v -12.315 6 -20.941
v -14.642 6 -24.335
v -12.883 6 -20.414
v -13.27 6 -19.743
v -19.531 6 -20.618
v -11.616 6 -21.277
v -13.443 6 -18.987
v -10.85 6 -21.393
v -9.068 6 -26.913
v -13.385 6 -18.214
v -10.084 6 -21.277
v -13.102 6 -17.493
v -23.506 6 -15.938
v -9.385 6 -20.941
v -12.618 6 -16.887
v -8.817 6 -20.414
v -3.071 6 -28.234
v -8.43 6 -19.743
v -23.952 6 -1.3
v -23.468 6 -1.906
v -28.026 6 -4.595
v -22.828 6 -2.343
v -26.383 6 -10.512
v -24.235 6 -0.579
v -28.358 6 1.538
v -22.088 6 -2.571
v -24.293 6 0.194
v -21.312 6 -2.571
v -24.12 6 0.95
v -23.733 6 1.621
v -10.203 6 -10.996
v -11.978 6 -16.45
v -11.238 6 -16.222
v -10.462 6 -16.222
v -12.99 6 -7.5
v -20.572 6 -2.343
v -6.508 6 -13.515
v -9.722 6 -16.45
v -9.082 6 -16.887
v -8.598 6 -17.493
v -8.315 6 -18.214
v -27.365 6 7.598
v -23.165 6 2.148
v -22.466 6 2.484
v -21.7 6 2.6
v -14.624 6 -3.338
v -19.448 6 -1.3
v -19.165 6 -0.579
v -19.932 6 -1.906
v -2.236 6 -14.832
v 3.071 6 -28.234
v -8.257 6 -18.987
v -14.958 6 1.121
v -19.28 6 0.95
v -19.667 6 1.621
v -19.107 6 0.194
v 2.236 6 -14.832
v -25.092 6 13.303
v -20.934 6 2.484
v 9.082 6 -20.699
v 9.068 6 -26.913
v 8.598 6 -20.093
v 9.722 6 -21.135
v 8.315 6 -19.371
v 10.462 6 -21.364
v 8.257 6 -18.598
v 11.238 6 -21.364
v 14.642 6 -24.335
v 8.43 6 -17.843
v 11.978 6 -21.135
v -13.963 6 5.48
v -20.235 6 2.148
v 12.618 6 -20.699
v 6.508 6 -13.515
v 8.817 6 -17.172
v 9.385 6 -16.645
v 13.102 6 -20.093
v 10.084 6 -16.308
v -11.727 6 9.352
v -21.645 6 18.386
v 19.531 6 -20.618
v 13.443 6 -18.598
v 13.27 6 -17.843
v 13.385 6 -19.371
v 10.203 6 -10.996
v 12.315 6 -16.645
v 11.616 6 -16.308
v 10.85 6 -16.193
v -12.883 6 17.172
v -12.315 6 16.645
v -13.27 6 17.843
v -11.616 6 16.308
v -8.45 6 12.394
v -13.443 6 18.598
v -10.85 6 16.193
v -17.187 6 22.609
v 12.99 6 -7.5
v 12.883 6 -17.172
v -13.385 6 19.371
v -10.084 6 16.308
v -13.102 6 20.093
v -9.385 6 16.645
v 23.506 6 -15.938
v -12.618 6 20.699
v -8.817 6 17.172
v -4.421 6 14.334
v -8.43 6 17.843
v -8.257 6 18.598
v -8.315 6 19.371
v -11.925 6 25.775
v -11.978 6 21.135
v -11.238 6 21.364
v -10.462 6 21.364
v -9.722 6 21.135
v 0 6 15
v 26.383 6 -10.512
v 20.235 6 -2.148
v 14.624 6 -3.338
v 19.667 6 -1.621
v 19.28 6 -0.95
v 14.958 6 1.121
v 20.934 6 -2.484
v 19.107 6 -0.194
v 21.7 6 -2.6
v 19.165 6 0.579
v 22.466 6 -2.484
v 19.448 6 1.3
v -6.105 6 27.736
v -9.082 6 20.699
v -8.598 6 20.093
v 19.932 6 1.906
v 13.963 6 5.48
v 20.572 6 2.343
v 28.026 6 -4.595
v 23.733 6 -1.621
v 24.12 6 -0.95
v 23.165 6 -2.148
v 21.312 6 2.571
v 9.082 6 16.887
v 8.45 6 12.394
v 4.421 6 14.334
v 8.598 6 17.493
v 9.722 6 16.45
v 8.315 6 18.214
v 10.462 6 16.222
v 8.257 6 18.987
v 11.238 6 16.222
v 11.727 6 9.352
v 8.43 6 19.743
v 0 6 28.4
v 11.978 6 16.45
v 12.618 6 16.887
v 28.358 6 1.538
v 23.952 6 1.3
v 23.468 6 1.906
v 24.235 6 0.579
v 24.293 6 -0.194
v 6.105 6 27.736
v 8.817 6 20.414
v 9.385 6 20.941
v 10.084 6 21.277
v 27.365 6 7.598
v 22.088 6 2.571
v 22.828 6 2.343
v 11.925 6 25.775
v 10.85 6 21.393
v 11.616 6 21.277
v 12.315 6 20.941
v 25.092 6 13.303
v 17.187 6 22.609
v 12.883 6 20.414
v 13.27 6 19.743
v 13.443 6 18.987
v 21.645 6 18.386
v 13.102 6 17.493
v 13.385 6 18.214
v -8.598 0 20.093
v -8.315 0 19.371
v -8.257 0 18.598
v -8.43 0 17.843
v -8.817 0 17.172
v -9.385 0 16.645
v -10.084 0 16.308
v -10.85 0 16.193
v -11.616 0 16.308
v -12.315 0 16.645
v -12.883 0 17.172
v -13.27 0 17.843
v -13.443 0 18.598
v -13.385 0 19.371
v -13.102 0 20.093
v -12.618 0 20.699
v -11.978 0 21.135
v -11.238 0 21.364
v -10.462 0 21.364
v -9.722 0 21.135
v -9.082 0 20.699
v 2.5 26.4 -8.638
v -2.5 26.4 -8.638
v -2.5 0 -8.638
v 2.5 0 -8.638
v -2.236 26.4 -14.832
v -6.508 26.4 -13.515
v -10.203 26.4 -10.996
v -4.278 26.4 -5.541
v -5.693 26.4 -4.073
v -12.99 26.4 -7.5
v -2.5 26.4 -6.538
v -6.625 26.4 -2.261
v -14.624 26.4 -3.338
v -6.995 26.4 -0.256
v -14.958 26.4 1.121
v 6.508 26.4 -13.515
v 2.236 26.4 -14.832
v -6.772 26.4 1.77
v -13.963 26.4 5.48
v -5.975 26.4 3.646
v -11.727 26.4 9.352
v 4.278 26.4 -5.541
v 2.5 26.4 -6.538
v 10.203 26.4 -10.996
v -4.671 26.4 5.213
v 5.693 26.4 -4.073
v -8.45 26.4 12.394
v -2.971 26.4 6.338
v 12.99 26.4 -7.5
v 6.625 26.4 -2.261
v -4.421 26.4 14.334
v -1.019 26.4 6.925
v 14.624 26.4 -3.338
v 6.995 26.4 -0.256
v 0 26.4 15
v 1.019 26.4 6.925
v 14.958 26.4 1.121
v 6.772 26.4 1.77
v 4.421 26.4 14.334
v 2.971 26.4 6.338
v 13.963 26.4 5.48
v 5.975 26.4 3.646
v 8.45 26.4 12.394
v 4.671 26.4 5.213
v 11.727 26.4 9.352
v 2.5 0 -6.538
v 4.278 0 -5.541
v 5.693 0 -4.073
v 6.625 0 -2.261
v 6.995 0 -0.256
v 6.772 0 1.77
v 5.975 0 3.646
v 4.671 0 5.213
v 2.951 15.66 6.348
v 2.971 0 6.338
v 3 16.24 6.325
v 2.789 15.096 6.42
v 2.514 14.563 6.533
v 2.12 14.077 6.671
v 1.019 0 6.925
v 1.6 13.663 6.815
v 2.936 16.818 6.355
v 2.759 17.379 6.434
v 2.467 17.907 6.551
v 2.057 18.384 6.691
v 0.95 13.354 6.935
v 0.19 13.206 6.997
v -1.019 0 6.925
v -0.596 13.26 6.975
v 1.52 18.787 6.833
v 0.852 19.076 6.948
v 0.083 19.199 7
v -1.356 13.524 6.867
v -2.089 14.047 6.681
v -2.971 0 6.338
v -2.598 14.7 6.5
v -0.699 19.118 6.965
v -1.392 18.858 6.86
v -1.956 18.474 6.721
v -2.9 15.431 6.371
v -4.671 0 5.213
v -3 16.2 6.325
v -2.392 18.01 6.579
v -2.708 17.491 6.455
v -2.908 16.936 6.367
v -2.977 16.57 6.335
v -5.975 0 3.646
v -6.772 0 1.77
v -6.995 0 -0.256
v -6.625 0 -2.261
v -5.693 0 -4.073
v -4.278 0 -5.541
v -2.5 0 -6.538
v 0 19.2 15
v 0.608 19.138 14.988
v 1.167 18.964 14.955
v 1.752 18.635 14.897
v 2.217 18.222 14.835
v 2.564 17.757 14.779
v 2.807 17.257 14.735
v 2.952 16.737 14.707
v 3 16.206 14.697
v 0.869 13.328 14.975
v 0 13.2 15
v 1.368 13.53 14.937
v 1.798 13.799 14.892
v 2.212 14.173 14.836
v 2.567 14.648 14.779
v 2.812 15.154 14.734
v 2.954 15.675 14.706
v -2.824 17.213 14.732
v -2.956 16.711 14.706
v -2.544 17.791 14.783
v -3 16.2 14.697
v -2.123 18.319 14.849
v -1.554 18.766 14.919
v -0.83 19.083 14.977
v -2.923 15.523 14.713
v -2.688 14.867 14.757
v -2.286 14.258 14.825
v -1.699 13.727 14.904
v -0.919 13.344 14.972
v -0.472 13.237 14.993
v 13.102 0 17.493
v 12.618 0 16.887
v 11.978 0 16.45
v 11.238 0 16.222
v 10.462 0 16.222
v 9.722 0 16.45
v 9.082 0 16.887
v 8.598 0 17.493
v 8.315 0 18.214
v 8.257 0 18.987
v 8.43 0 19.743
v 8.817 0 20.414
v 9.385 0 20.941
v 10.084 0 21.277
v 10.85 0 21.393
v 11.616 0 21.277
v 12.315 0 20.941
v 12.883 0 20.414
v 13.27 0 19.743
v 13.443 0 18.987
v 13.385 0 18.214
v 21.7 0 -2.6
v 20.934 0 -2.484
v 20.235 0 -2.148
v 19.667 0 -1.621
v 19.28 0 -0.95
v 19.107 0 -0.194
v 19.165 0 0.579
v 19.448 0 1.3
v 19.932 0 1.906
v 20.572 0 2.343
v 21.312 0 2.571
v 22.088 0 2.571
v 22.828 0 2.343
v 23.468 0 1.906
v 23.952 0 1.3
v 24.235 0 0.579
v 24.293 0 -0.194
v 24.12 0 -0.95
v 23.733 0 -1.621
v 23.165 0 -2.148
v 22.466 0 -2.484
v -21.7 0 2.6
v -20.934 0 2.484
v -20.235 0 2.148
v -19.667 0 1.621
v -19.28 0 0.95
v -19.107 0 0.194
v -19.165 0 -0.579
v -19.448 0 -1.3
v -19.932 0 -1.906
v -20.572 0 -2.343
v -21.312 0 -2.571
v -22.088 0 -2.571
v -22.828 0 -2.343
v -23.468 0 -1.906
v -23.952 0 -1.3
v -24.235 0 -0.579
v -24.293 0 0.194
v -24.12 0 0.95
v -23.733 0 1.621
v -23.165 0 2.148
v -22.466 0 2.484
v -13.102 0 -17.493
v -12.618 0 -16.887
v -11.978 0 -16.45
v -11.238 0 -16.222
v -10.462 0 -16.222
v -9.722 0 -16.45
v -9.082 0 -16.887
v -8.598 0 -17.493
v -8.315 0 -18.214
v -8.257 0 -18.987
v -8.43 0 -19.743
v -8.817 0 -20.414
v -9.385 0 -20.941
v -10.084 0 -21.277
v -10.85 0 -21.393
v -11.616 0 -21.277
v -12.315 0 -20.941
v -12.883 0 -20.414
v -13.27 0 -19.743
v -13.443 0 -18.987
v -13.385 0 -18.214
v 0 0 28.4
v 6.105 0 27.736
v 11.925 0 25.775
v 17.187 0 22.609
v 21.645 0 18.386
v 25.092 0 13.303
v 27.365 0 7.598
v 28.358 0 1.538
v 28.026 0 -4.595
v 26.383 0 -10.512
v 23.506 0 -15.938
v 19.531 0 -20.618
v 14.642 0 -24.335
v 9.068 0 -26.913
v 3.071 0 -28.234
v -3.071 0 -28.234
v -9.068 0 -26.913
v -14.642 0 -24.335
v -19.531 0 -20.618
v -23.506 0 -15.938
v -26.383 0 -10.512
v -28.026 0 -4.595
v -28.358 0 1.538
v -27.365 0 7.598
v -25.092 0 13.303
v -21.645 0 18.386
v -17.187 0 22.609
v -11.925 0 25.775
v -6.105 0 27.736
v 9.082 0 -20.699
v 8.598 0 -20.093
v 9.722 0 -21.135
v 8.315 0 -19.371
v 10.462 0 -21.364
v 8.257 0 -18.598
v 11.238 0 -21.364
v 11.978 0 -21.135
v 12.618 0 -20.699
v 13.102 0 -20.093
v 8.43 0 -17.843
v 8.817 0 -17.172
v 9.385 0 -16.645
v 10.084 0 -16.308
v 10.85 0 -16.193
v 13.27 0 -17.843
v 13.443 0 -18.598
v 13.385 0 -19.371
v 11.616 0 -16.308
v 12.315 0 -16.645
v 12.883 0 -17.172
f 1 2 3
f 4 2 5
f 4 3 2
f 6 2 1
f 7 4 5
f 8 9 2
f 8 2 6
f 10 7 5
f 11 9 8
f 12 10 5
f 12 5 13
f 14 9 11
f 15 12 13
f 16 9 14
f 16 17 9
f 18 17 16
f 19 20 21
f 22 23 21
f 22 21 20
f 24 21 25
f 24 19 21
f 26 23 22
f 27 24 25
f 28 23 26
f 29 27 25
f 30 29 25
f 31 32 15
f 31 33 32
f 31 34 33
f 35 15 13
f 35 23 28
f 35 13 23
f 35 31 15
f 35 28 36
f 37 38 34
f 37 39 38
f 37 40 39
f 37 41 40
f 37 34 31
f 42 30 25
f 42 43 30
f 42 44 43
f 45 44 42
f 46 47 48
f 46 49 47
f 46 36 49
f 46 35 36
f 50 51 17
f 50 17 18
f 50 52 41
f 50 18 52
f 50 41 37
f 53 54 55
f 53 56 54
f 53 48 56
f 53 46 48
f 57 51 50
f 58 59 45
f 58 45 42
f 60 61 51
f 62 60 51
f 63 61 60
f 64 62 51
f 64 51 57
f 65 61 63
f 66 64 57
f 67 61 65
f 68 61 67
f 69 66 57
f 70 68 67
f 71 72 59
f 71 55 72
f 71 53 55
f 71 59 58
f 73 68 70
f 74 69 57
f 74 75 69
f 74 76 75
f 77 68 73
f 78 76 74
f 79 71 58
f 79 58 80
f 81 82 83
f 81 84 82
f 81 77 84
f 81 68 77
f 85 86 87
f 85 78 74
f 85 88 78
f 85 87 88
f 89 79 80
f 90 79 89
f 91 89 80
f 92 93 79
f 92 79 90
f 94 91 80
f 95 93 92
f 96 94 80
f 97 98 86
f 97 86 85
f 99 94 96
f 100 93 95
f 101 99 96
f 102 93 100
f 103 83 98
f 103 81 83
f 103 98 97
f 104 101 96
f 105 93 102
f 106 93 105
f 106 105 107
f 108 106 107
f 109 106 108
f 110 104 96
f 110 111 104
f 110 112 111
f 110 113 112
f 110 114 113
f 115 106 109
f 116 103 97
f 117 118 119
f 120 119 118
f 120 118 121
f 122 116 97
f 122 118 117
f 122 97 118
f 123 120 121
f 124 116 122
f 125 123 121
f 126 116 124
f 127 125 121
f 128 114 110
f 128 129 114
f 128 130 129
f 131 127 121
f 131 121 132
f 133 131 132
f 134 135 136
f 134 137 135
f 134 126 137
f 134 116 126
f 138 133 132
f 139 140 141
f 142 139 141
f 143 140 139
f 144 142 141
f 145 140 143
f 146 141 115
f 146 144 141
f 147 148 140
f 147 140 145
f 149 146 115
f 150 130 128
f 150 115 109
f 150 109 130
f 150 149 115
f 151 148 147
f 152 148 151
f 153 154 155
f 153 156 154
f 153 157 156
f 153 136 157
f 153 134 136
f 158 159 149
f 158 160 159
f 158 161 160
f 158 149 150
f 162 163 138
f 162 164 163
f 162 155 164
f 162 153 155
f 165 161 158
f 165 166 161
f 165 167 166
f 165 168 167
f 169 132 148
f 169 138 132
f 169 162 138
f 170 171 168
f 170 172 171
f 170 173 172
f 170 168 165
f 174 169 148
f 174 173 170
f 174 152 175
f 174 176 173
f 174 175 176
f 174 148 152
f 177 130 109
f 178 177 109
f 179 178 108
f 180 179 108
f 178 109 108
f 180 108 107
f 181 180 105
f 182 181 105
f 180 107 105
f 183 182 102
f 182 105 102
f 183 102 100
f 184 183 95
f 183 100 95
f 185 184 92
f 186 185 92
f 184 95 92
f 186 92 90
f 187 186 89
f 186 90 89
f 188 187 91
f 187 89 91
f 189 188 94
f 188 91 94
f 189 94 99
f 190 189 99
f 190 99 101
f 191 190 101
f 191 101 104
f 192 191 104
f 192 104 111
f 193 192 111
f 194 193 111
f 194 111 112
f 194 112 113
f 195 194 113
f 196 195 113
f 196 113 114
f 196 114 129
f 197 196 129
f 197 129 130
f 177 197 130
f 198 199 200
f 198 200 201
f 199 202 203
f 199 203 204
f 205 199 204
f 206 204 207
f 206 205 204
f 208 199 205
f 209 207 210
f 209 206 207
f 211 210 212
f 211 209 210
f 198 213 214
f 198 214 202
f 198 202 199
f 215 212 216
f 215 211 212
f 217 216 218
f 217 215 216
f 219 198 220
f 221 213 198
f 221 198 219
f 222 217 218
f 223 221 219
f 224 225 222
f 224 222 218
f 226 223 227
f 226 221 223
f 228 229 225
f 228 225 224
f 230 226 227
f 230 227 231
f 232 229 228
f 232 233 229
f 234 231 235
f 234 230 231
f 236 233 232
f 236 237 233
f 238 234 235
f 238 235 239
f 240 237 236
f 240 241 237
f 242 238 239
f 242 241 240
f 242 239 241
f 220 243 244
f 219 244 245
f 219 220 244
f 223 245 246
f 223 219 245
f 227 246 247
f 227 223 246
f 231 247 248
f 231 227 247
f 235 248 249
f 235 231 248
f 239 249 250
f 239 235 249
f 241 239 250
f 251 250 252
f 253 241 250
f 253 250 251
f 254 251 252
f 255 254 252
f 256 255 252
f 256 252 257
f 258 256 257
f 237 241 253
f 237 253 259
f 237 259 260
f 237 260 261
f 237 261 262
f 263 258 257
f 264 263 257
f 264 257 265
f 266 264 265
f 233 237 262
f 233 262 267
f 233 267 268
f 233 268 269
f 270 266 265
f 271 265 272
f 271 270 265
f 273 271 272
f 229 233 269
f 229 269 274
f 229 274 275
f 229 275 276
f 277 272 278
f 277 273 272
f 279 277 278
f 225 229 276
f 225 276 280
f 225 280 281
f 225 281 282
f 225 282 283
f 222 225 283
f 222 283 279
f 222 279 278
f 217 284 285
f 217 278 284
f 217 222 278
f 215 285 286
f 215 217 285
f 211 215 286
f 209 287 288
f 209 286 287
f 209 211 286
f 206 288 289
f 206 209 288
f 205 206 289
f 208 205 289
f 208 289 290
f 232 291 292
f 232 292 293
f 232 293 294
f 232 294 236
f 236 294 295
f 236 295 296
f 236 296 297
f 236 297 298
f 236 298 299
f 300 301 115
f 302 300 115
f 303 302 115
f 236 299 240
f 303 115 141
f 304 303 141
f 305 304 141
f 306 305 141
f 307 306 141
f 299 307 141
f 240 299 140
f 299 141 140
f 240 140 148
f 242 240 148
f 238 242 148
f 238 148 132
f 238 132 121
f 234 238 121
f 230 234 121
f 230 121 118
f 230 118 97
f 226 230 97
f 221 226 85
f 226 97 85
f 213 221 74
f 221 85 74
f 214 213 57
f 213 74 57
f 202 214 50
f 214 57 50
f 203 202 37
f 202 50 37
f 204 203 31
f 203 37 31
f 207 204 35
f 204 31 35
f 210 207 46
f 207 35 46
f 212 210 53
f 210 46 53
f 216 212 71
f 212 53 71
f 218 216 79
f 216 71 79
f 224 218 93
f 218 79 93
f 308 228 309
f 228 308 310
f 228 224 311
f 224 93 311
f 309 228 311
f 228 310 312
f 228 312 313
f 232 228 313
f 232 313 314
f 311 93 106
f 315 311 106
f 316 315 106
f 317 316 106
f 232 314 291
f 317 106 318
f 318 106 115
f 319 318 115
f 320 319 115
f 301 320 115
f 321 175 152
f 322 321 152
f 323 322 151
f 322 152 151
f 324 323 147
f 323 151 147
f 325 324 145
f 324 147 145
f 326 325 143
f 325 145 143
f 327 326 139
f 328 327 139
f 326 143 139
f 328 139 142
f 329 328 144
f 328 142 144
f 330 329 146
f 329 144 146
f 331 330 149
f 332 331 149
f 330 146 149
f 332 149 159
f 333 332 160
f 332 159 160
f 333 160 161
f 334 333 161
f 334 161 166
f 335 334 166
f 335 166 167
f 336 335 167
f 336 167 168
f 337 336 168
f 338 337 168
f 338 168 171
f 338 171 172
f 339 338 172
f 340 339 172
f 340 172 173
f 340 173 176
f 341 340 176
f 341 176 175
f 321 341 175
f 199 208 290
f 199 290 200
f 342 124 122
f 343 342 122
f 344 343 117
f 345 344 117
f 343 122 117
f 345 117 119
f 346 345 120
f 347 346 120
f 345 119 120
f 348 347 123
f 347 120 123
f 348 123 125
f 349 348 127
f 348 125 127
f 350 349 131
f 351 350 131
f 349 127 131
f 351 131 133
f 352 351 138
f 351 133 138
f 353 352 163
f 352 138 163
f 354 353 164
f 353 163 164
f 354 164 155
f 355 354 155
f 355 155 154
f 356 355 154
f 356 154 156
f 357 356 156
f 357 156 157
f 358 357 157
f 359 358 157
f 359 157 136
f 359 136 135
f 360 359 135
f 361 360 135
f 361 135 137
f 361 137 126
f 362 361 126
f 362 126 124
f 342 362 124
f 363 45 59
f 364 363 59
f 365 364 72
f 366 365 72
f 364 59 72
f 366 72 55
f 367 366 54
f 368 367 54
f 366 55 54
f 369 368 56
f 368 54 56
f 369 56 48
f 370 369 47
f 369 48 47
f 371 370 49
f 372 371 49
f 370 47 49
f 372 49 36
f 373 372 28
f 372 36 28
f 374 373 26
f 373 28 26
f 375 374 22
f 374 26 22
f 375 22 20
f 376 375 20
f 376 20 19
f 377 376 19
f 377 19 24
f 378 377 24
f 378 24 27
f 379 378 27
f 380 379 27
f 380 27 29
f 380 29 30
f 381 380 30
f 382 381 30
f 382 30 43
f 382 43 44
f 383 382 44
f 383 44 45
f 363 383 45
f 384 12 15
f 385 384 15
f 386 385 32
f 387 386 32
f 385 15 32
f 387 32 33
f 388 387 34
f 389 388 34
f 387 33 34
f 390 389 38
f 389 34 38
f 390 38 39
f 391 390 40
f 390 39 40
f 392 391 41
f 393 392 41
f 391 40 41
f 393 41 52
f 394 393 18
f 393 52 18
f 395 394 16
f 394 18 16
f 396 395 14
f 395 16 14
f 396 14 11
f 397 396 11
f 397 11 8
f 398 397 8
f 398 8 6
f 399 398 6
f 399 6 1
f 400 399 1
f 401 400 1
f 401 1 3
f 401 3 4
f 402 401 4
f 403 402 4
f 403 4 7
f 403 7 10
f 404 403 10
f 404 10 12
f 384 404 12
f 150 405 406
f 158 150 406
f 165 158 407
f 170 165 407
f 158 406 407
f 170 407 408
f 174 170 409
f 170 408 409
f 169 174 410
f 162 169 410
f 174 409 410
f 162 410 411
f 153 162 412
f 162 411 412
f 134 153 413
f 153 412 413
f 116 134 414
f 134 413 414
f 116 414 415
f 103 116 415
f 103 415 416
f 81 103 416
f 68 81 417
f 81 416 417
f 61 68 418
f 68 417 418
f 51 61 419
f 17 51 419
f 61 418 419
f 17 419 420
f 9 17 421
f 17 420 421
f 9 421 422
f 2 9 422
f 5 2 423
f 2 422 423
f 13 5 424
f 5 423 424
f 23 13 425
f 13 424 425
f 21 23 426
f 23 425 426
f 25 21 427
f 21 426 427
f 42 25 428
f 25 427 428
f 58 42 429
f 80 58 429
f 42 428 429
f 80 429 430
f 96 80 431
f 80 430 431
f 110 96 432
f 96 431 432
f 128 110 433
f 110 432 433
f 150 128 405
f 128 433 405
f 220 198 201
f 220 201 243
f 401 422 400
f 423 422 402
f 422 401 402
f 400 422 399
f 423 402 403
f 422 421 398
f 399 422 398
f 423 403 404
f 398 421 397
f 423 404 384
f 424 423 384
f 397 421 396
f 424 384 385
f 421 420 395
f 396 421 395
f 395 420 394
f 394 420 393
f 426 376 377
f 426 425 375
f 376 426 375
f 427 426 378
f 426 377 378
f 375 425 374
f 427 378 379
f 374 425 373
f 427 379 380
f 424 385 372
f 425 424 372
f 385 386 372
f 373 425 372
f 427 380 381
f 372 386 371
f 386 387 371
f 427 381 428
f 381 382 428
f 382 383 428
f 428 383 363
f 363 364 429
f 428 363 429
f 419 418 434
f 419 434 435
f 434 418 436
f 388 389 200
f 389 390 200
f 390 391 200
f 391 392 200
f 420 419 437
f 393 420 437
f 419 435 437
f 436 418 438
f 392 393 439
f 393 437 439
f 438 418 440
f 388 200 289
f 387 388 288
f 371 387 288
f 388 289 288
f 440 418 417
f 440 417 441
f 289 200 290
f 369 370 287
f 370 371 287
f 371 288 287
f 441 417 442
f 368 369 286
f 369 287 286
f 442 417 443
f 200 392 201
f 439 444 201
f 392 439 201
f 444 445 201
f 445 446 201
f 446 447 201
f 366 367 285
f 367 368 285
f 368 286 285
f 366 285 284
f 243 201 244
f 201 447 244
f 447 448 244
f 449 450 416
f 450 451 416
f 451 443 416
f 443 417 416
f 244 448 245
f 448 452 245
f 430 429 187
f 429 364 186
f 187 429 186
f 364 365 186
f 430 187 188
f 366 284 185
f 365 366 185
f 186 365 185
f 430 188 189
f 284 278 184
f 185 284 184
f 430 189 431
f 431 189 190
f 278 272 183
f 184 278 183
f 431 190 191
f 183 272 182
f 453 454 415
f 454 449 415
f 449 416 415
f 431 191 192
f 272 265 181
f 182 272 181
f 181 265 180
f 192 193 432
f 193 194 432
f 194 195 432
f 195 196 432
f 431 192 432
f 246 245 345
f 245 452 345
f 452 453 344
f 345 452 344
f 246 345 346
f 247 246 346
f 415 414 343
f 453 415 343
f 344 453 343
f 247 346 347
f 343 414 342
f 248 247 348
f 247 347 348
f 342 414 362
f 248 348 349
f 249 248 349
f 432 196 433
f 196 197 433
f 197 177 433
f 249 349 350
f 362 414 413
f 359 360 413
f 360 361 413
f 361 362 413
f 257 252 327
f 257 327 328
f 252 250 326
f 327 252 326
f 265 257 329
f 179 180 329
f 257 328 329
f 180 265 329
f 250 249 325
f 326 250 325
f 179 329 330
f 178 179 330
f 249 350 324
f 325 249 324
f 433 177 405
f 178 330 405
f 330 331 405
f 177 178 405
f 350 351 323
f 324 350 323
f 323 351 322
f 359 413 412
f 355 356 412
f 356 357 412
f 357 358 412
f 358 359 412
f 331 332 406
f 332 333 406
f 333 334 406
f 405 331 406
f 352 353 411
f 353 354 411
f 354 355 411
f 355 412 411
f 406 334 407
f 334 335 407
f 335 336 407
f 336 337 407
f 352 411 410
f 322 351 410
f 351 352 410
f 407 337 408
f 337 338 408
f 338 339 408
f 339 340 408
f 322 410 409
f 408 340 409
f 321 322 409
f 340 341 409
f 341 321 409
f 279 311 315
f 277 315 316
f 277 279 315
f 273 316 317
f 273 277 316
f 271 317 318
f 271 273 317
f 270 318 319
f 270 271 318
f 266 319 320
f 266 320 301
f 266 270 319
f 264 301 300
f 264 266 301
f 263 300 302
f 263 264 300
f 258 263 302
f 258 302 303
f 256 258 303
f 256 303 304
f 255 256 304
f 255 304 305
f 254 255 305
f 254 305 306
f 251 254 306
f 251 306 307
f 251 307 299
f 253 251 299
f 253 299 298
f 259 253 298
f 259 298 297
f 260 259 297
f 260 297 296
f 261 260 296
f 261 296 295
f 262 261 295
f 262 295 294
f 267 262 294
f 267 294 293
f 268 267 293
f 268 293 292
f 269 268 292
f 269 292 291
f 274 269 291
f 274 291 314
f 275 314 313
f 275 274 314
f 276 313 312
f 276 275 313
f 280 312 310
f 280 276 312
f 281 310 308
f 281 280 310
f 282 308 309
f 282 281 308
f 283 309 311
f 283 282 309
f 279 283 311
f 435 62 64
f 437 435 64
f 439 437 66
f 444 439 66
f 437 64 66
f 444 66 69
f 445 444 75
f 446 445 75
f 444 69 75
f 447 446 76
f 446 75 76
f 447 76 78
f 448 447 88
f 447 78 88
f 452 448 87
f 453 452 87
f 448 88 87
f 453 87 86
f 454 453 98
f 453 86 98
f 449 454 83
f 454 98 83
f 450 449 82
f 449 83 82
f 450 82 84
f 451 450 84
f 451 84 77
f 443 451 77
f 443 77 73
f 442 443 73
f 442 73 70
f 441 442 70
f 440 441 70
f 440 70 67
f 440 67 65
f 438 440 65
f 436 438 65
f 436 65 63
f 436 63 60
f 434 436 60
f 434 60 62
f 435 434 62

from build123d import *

# Parameters (mm, degrees)
SKETCH1_R           = 28.4
BOSS_EXTRUDE1_DEPTH = 6
SKETCH2_R           = 15
BOSS_EXTRUDE2_DEPTH = 20.4
CUT_EXTRUDE1_DEPTH  = 49.063291606
SKETCH4_R           = 3
CUT_EXTRUDE2_DEPTH  = 49.063291606
SKETCH5_R           = 2.6
CUT_EXTRUDE3_DEPTH  = 46.047530499
CIRPATTERN1_COUNT   = 6


with BuildPart() as part:
    # Sketch1 → Boss-Extrude1 (new body)
    with BuildSketch(Plane(origin=(0, 0, 0), x_dir=(1, 0, 0), z_dir=(0, 1, 0))):
        with Locations(Location((0, 0, 0), (0, 0, 270))):
            Circle(SKETCH1_R)
    extrude(amount=BOSS_EXTRUDE1_DEPTH)

    # Sketch2 → Boss-Extrude2 (add)
    with BuildSketch(Plane(origin=(0, 6, 0), x_dir=(1, 0, 0), z_dir=(0, 1, 0))):
        with Locations(Location((0, 0, 0), (0, 0, 270))):
            Circle(SKETCH2_R)
    extrude(amount=BOSS_EXTRUDE2_DEPTH)

    # Sketch3 → Cut-Extrude1 (cut, through all)
    with BuildSketch(Plane(origin=(0, 26.4, 0), x_dir=(1, 0, 0), z_dir=(0, 1, 0))):
        with BuildLine():
            Line((-2.5, 8.638348415), (2.5, 8.638348415))
            Line((2.5, 8.638348415), (2.5, 6.538348415))
            ThreePointArc((2.5, 6.538348415), (0, -7), (-2.5, 6.538348415))
            Line((-2.5, 6.538348415), (-2.5, 8.638348415))
        make_face()
    extrude(amount=-CUT_EXTRUDE1_DEPTH, mode=Mode.SUBTRACT)

    # Sketch4 → Cut-Extrude2 (cut, through all)
    with BuildSketch(Plane.XY):
        with Locations(Location((0, 16.2, 0), (0, 0, 180))):
            Circle(SKETCH4_R)
    extrude(amount=CUT_EXTRUDE2_DEPTH, mode=Mode.SUBTRACT)

    # Sketch5 → Cut-Extrude3 (cut, through all)
    with BuildSketch(Plane(origin=(0, 6, 0), x_dir=(1, 0, 0), z_dir=(0, 1, 0))):
        with Locations(Location((-21.7, 0, 0), (0, 0, 270))):
            Circle(SKETCH5_R)
    cut_extrude3 = extrude(amount=-CUT_EXTRUDE3_DEPTH, mode=Mode.SUBTRACT)

    # CirPattern1: Cut-Extrude3 ×6 about axis
    cirpattern1_axis = Axis((0, 0, 0), (0, 1, 0))
    for i in range(1, CIRPATTERN1_COUNT):
        add(cut_extrude3.rotate(cirpattern1_axis, i * 360 / CIRPATTERN1_COUNT), mode=Mode.SUBTRACT)


solid = part.part
